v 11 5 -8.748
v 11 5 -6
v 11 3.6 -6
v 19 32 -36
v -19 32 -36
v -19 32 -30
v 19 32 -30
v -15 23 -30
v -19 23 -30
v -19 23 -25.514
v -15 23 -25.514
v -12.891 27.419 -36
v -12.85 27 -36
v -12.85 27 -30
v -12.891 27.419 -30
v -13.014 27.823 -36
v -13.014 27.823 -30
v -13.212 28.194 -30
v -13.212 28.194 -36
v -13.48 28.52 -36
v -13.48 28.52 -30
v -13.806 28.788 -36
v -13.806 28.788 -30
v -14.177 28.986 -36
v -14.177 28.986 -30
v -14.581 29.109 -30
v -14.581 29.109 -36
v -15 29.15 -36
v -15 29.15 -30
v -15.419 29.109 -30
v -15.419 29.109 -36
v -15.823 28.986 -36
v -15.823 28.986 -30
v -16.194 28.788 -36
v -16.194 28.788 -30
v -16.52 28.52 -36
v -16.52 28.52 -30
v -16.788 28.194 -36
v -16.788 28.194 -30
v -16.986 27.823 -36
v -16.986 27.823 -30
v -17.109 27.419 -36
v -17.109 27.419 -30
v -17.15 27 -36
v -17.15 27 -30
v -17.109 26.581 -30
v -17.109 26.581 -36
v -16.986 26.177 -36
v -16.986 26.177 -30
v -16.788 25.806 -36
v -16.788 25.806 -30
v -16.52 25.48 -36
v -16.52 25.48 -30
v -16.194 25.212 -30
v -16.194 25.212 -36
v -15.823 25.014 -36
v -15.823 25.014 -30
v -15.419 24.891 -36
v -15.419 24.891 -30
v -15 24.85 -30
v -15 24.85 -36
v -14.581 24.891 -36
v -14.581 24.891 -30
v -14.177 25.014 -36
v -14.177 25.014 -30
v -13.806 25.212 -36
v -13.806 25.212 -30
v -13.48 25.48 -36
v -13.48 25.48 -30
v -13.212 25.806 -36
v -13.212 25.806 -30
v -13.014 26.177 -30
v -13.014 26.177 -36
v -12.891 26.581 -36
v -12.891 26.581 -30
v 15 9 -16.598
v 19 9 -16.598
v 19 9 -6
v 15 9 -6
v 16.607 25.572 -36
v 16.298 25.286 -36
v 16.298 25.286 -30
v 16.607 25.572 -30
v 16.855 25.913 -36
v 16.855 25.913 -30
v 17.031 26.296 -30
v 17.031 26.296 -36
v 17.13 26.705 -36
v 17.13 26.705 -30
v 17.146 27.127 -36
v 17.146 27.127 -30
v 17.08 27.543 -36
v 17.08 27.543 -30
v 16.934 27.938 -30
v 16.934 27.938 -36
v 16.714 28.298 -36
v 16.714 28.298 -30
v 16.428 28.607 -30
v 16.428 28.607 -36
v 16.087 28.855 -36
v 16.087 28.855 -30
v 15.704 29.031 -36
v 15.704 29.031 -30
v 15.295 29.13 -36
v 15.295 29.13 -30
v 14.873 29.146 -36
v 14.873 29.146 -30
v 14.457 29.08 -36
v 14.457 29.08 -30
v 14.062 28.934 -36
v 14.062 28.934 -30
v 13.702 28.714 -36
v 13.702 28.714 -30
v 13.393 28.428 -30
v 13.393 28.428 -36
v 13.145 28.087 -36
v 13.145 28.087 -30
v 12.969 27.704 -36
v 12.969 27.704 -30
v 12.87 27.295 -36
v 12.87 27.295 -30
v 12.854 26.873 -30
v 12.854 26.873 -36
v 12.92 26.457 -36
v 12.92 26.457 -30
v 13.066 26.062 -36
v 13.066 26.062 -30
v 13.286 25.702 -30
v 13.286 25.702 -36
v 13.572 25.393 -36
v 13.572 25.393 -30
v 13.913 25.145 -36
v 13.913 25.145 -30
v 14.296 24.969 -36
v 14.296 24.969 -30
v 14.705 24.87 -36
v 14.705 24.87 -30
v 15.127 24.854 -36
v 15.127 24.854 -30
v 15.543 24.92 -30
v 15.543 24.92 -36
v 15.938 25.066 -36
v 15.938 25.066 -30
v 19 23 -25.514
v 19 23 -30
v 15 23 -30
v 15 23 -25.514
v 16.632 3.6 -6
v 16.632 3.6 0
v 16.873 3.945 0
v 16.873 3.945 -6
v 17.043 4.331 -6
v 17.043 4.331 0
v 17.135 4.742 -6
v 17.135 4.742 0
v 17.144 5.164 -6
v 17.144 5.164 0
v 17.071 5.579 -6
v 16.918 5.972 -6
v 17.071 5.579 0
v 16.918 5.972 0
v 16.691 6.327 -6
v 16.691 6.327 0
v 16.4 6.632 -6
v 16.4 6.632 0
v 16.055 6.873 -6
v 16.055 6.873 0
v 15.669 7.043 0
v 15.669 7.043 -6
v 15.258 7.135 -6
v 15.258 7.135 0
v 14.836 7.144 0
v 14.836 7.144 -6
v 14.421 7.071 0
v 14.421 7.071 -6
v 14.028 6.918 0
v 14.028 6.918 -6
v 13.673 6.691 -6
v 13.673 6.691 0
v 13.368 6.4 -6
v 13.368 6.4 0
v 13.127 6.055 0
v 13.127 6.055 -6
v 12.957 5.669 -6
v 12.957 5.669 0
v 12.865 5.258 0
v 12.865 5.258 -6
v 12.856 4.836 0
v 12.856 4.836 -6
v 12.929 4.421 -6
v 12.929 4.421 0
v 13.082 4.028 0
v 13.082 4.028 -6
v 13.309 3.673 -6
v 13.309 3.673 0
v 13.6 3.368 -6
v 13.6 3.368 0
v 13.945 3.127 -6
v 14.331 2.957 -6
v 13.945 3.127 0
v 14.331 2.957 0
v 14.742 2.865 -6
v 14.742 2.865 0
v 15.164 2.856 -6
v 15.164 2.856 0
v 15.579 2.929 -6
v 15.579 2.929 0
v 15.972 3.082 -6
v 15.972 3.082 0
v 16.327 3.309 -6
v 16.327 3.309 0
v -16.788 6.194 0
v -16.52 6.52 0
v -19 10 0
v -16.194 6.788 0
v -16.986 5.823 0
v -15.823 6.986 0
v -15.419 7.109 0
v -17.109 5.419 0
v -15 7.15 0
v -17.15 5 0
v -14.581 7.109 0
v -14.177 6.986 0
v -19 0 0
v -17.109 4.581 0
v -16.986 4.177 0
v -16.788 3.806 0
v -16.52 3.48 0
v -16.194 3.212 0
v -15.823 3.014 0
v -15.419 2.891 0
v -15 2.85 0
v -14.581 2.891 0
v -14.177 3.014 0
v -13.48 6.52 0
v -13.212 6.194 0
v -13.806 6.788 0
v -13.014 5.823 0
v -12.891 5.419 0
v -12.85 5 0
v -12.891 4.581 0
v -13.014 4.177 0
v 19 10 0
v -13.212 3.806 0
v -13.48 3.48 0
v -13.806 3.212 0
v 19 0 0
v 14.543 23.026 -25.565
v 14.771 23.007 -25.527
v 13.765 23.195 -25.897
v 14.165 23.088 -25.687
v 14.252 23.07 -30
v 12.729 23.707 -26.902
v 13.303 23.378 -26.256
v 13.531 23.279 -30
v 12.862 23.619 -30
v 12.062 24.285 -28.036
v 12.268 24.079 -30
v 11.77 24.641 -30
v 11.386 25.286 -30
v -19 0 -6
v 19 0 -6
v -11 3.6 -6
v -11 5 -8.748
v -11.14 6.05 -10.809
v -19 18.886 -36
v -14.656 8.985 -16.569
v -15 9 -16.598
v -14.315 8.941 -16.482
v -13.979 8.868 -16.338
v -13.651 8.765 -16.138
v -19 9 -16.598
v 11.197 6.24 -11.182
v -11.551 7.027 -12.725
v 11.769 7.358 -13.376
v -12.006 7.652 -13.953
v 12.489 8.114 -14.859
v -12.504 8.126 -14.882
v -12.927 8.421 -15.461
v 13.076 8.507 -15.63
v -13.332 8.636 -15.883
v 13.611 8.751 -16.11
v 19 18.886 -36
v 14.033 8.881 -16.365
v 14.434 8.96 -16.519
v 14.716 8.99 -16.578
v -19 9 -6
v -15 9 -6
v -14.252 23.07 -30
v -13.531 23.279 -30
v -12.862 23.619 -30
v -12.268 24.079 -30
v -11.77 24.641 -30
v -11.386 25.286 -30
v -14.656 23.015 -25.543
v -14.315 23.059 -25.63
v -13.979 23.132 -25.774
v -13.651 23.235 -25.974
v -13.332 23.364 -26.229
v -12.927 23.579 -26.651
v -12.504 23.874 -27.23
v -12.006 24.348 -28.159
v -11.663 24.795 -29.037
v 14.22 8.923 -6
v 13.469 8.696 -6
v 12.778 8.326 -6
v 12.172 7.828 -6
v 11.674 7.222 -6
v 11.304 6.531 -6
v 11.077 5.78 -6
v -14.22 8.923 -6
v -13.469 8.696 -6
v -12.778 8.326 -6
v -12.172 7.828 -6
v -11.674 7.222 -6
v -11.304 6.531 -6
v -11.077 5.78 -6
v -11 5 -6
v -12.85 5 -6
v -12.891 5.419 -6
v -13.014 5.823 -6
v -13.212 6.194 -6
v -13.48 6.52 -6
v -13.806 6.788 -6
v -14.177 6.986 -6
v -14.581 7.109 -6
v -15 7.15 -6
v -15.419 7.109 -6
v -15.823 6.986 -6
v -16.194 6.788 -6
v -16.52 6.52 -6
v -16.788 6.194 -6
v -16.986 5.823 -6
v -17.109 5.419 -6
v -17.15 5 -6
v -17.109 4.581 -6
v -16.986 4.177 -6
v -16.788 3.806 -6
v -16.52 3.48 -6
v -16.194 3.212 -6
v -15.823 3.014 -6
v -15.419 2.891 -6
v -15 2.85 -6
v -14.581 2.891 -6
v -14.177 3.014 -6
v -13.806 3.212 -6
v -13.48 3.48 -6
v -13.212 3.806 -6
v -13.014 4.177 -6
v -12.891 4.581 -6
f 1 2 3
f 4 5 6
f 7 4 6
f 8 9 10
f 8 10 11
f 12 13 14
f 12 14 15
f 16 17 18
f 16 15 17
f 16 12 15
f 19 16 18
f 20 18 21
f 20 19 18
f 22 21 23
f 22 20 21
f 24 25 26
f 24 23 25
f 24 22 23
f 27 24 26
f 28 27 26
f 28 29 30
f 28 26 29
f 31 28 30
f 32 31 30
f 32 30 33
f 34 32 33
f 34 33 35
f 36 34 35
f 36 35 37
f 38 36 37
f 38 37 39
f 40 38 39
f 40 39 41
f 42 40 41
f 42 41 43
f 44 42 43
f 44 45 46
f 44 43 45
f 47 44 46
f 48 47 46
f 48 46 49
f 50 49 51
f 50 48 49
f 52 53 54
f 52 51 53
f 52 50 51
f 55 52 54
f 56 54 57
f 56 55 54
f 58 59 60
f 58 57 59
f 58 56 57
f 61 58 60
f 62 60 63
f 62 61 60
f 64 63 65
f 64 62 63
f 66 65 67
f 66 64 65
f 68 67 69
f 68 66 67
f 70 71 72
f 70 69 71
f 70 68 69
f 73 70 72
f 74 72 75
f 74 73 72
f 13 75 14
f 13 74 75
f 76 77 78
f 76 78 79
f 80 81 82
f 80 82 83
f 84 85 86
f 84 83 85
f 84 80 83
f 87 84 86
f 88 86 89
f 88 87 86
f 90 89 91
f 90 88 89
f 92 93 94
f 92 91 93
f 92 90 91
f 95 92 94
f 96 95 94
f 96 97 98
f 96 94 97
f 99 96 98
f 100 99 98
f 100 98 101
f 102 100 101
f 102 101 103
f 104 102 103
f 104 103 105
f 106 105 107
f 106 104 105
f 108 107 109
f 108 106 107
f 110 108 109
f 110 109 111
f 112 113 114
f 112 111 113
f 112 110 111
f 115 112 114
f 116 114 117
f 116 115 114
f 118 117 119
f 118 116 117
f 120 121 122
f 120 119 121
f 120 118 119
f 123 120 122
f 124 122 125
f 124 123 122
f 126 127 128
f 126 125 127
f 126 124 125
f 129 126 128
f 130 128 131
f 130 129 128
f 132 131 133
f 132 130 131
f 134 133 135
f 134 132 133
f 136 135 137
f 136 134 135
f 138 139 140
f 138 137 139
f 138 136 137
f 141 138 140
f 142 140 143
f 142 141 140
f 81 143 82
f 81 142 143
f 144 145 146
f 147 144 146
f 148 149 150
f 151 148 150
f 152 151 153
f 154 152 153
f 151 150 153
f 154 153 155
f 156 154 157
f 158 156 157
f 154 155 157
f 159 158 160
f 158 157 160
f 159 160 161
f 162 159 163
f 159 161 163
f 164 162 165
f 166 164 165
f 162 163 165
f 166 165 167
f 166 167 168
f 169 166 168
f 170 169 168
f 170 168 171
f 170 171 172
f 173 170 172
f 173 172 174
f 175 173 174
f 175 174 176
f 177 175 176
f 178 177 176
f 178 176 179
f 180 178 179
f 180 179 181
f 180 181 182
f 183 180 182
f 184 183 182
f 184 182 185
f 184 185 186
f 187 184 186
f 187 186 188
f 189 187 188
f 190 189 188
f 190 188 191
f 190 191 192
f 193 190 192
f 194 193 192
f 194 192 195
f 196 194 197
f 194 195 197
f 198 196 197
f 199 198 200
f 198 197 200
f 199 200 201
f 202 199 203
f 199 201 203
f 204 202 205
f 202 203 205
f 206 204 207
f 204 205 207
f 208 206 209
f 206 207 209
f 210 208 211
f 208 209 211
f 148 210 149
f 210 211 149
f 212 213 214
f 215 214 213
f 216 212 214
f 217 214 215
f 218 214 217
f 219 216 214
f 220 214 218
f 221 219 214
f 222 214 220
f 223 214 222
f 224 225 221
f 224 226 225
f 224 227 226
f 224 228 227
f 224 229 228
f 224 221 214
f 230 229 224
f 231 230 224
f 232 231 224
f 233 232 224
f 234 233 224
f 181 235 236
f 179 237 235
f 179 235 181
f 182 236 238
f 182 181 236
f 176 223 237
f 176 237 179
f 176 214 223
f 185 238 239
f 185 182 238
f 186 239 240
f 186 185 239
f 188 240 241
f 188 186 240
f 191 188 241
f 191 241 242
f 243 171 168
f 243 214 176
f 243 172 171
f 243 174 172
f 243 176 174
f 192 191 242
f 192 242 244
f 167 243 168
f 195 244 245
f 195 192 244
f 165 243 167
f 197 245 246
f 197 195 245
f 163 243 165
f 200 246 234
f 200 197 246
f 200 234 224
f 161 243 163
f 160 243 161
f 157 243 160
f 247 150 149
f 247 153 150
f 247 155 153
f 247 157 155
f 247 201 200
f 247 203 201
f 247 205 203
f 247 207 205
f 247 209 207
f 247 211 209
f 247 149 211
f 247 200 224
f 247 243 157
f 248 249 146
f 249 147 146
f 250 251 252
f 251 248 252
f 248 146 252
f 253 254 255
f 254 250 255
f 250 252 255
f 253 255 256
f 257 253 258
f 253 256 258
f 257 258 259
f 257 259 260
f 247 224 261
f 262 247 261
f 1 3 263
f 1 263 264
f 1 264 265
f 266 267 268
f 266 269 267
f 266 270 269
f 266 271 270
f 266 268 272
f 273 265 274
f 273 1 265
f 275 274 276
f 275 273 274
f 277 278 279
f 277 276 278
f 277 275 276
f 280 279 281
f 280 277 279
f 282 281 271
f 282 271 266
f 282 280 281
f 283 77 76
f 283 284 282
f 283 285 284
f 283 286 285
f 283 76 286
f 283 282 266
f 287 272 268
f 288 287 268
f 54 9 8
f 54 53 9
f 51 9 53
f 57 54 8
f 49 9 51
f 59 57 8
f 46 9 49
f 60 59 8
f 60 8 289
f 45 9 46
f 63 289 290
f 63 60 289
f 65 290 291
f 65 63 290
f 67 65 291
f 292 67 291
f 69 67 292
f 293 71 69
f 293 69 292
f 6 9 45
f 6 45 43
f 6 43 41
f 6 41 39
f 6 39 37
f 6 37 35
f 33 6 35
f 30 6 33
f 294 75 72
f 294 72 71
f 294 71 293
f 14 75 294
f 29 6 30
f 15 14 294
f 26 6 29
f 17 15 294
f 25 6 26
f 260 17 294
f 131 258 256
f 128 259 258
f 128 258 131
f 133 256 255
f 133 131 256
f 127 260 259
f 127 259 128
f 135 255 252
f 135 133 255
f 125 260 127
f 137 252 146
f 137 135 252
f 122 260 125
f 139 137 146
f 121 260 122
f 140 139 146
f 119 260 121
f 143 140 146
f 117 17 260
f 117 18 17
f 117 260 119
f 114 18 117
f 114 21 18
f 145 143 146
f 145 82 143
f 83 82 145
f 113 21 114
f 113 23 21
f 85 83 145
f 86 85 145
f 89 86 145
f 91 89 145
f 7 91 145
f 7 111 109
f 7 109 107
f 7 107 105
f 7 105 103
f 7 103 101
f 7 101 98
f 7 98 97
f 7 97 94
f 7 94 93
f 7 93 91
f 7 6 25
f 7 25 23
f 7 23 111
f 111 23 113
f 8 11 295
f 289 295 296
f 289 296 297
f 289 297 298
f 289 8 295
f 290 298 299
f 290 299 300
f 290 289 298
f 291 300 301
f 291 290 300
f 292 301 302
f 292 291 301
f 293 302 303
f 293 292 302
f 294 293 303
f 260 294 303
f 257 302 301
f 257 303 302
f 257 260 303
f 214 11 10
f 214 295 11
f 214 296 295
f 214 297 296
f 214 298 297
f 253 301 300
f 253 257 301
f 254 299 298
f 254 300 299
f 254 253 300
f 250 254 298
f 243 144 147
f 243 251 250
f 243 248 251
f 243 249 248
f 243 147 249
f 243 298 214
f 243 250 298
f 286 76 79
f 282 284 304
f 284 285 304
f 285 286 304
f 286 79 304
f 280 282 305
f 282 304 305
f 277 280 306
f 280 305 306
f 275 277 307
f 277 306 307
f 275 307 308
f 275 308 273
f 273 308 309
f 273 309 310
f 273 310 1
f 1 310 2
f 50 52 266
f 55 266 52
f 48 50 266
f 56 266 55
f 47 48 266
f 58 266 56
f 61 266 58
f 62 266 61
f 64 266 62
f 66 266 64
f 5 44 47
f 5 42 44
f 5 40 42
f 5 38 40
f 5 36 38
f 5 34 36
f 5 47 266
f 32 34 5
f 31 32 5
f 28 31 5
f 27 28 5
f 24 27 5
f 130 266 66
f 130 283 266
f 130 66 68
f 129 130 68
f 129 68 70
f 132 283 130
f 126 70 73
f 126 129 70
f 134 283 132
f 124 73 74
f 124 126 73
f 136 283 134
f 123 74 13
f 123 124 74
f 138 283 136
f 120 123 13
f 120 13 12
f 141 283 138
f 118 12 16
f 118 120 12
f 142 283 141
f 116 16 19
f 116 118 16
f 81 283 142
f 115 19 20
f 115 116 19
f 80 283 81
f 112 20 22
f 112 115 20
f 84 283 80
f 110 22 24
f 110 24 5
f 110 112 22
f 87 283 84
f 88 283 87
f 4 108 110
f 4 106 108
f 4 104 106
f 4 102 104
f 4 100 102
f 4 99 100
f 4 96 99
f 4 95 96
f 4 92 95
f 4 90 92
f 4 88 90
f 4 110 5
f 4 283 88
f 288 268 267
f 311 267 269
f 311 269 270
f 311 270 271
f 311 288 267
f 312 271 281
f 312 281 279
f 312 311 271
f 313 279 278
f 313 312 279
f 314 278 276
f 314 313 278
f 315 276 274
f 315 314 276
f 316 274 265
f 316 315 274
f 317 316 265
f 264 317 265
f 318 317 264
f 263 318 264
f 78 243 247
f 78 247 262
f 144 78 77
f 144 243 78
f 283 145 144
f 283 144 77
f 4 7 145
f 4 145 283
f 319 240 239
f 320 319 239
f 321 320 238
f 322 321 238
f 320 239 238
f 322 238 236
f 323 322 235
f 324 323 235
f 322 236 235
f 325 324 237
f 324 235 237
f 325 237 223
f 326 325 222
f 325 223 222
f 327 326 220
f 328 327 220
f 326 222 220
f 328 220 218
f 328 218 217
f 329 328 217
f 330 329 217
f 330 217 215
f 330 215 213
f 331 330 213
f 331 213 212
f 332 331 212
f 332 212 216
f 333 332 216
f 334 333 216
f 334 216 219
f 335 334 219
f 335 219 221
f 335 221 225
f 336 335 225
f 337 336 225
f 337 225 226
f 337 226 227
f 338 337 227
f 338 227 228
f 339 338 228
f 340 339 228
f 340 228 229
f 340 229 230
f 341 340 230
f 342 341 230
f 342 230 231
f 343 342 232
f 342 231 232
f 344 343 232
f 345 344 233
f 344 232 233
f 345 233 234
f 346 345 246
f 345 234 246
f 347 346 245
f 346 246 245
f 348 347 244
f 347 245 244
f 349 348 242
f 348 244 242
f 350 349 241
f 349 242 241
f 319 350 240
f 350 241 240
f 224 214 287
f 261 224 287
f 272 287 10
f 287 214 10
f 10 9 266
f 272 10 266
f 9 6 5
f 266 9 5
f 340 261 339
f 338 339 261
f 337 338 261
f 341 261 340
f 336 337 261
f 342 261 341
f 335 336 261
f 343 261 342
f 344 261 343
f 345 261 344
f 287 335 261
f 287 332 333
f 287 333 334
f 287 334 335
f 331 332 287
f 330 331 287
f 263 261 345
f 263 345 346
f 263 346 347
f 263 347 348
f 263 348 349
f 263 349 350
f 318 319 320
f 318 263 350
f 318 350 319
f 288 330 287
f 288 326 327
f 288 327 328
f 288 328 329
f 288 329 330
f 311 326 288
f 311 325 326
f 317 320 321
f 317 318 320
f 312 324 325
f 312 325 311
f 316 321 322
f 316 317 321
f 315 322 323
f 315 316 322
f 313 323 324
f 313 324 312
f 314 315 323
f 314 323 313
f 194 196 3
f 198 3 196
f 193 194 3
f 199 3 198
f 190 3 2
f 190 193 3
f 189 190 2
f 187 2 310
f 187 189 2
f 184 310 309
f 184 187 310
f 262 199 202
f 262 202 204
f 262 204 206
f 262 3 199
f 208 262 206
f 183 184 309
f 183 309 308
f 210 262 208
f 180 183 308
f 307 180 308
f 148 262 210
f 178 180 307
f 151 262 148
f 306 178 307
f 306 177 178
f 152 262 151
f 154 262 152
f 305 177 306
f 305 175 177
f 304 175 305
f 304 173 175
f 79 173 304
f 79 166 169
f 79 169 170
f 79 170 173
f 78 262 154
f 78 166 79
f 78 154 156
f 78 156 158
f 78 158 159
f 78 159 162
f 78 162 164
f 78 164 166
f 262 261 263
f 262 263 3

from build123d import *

# Parameters (mm, degrees)
BOSS_EXTRUDE1_DEPTH     = 19
CUT_EXTRUDE1_DEPTH      = 48.801673611
CUT_EXTRUDE1_DEPTH_BACK = 48.801673611
SKETCH5_R               = 2.15
SKETCH6_R               = 2.15
CUT_EXTRUDE2_DEPTH      = 6
CUT_EXTRUDE6_DEPTH      = 48.801673611
CUT_EXTRUDE7_DEPTH      = 36


with BuildPart() as part:
    # Sketch2 → Boss-Extrude1 (new, symmetric)
    with BuildSketch(Plane(origin=(0, 0, 0), x_dir=(0, 0, -1), z_dir=(1, 0, 0))):
        Polygon((0, 0), (6, 0), (6, 3.6), (36, 18.885763485), (36, 32), (30, 32), (30, 25.285763485), (0, 10), align=None)
    extrude(amount=BOSS_EXTRUDE1_DEPTH, both=True)

    # Sketch5 → Cut-Extrude1 (cut, two sides: drawn at the far end of the back side and taken through both)
    with BuildSketch(Plane.XY.offset(-30).offset(-CUT_EXTRUDE1_DEPTH_BACK)):
        with Locations((-15, 27)):
            Circle(SKETCH5_R)
        with Locations(Location((15, 27, 0), (0, 0, 307.125127623))):
            Circle(SKETCH5_R)
    extrude(amount=CUT_EXTRUDE1_DEPTH + CUT_EXTRUDE1_DEPTH_BACK, mode=Mode.SUBTRACT)

    # Sketch6 → Cut-Extrude2 (cut)
    with BuildSketch(Plane.XY):
        with Locations((-15, 5)):
            Circle(SKETCH6_R)
        with Locations(Location((15, 5, 0), (0, 0, 319.370671217))):
            Circle(SKETCH6_R)
    extrude(amount=-CUT_EXTRUDE2_DEPTH, mode=Mode.SUBTRACT)

    # Sketch9 → Cut-Extrude6 (cut, through all)
    with BuildSketch(Plane(origin=(0, 0, -6), x_dir=(-1, 0, 0), z_dir=(0, 0, -1))):
        with BuildLine():
            Line((-19, 0), (-19, 9))
            Line((-19, 9), (-15, 9))
            ThreePointArc((-15, 9), (-12.171572875, 7.828427125), (-11, 5))
            Line((-11, 5), (-11, 0))
            Line((-11, 0), (-19, 0))
        make_face()
        with BuildLine():
            Line((19, 0), (19, 9))
            Line((19, 9), (15, 9))
            ThreePointArc((15, 9), (12.171572875, 7.828427125), (11, 5))
            Line((11, 5), (11, 0))
            Line((11, 0), (19, 0))
        make_face()
    extrude(amount=CUT_EXTRUDE6_DEPTH, mode=Mode.SUBTRACT)

    # Sketch11 → Cut-Extrude7 (cut)
    with BuildSketch(Plane.XY.offset(-30)):
        with BuildLine():
            Line((11, 32), (19, 32))
            Line((19, 32), (19, 23))
            Line((19, 23), (15, 23))
            ThreePointArc((15, 23), (12.171572875, 24.171572875), (11, 27))
            Line((11, 27), (11, 32))
        make_face()
        with BuildLine():
            Line((-19, 23), (-15, 23))
            ThreePointArc((-15, 23), (-12.171572875, 24.171572875), (-11, 27))
            Line((-11, 27), (-11, 32))
            Line((-11, 32), (-19, 32))
            Line((-19, 32), (-19, 23))
        make_face()
    extrude(amount=CUT_EXTRUDE7_DEPTH, mode=Mode.SUBTRACT)


solid = part.part
